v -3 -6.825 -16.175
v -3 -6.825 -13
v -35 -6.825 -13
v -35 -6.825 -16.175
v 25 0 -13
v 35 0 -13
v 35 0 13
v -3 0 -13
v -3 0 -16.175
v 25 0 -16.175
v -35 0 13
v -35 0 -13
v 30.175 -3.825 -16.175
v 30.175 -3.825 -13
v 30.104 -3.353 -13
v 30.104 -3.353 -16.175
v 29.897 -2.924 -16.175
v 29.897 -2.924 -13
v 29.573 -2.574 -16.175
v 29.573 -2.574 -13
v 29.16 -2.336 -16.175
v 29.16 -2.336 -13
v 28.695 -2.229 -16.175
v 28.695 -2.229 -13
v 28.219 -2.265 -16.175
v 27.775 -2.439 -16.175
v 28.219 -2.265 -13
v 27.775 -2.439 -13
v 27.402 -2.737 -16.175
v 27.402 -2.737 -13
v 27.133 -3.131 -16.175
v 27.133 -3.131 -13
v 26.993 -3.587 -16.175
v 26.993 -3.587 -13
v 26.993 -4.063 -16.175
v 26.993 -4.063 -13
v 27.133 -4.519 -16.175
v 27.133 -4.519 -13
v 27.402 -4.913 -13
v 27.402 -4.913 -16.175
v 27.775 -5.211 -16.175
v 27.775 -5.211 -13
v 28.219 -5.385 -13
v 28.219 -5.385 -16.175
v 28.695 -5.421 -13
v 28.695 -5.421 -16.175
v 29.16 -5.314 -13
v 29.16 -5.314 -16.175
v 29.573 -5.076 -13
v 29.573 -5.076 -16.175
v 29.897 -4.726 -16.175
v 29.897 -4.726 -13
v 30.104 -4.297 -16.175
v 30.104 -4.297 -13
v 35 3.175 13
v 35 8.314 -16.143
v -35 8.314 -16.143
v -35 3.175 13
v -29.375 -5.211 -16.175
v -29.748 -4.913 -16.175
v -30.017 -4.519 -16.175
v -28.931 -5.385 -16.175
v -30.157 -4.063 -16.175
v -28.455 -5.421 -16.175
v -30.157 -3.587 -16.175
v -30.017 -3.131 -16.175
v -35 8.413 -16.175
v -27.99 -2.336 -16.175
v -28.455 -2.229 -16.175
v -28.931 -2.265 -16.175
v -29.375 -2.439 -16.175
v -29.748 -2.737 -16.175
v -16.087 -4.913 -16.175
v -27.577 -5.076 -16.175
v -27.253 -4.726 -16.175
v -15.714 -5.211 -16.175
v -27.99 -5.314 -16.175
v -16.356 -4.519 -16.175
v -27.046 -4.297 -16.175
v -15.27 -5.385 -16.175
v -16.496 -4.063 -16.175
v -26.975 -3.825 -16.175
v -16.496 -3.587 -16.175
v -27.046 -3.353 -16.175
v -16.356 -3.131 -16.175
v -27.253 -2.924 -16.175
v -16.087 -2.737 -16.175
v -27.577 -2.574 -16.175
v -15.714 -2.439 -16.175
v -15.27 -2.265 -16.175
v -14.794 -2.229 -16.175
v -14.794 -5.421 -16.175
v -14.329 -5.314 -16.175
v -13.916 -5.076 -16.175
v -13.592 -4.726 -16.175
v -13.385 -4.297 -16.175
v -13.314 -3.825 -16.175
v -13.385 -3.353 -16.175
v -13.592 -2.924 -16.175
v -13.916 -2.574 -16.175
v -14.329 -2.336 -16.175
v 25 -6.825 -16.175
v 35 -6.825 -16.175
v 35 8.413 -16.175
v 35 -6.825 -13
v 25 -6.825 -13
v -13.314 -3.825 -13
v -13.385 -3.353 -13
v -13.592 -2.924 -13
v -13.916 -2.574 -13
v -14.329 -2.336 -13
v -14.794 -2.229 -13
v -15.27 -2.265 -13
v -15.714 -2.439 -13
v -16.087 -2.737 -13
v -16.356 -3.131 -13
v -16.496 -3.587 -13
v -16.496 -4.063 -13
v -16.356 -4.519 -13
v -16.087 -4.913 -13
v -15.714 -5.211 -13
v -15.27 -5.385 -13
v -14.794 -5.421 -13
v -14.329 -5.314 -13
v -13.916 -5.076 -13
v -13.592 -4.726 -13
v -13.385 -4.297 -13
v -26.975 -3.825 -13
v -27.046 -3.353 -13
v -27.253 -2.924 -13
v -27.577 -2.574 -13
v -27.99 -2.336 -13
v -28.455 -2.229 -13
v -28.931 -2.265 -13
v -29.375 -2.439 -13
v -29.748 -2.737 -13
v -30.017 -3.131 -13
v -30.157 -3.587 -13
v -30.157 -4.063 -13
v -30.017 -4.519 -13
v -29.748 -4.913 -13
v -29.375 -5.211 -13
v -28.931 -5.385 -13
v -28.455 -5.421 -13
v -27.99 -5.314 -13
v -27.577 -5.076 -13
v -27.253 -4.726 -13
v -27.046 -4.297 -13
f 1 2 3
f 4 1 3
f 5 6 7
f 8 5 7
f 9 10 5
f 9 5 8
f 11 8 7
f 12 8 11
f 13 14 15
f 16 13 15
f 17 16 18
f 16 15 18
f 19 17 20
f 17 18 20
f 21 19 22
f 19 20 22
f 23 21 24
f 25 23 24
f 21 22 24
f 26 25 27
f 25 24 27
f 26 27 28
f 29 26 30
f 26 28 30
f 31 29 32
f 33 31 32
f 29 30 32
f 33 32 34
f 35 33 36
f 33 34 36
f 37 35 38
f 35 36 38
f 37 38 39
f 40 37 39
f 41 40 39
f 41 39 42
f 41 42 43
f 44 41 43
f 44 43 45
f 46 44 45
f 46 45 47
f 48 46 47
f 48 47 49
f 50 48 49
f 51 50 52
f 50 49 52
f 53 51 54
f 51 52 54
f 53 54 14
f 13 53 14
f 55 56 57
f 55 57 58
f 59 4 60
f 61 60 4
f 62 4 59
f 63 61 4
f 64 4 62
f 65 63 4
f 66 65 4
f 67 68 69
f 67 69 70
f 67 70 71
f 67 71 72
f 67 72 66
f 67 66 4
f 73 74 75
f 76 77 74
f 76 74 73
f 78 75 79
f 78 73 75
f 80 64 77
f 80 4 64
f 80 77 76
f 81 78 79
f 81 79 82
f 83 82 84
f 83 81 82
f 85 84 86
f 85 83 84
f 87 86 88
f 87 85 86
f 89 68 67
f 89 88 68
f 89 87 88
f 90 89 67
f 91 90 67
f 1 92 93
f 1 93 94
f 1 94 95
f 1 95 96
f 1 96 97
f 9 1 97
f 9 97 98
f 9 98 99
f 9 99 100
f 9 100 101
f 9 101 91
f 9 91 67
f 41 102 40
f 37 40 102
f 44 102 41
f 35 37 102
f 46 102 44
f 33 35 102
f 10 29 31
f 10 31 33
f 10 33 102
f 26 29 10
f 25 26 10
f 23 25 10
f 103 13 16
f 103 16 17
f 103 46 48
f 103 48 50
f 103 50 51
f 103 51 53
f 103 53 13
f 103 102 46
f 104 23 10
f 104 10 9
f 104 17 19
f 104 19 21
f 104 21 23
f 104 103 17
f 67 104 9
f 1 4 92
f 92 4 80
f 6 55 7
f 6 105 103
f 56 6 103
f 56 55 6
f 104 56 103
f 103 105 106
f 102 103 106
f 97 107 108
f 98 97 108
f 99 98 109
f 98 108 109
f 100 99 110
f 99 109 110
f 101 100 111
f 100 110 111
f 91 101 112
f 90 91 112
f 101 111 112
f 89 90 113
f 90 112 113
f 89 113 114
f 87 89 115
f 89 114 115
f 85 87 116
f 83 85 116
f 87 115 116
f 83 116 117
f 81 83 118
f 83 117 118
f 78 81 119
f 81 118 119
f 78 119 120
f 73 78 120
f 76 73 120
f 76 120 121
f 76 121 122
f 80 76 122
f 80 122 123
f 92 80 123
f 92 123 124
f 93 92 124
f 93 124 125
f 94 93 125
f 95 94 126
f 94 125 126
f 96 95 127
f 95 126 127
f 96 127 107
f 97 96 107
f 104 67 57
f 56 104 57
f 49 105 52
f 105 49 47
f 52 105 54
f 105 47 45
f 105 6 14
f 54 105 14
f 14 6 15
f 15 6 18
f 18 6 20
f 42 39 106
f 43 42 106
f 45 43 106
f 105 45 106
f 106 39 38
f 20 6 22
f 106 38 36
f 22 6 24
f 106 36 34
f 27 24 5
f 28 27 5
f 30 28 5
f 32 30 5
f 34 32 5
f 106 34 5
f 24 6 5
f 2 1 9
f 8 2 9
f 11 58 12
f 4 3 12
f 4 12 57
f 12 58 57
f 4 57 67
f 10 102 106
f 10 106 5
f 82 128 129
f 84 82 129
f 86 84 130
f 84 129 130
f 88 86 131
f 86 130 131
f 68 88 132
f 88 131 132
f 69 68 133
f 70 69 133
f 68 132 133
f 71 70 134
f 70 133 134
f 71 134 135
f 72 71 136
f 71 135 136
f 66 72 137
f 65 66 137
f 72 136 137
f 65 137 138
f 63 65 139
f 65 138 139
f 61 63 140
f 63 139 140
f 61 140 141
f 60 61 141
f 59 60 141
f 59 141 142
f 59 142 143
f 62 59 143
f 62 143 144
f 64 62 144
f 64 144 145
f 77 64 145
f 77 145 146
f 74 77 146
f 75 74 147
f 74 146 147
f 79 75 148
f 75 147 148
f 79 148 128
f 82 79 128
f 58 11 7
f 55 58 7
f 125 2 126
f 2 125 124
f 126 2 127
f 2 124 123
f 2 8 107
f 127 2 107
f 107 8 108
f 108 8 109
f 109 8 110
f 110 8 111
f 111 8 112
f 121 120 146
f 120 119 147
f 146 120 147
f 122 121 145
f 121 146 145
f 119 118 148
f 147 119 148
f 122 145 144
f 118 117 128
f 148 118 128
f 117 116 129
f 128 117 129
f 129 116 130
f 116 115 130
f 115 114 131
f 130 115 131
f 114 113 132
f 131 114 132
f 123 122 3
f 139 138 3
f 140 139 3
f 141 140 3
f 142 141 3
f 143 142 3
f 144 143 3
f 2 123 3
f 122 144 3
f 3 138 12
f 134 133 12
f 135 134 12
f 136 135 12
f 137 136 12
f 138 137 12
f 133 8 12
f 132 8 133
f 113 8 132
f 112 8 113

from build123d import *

# Parameters (mm, degrees)
SKETCH1_W           = 70
SKETCH1_H           = 26
BOSS_EXTRUDE1_DEPTH = 3.175
SKETCH2_W           = 70
SKETCH2_H           = 10
BOSS_EXTRUDE2_DEPTH = 3.175
SKETCH3_R           = 1.6
CUT_EXTRUDE1_DEPTH  = 3.175
BOSS_EXTRUDE3_DEPTH = 70
SKETCH5_W           = 28
SKETCH5_H           = 6.825
CUT_EXTRUDE2_DEPTH  = 10


with BuildPart() as part:
    # Sketch1 → Boss-Extrude1 (new body)
    with BuildSketch(Plane(origin=(0, 0, 0), x_dir=(1, 0, 0), z_dir=(0, 1, 0))):
        Rectangle(SKETCH1_W, SKETCH1_H)
    extrude(amount=BOSS_EXTRUDE1_DEPTH)

    # Sketch2 → Boss-Extrude2 (add)
    with BuildSketch(Plane(origin=(0, 0, -13), x_dir=(-1, 0, 0), z_dir=(0, 0, -1))):
        with Locations((0, -1.825)):
            Rectangle(SKETCH2_W, SKETCH2_H)
    extrude(amount=BOSS_EXTRUDE2_DEPTH)

    # Sketch3 → Cut-Extrude1 (cut)
    with BuildSketch(Plane.XY.offset(-13)):
        with Locations((-14.914, -3.825)):
            Circle(SKETCH3_R)
        with Locations((28.575, -3.825)):
            Circle(SKETCH3_R)
        with Locations((-28.575, -3.825)):
            Circle(SKETCH3_R)
    extrude(amount=-CUT_EXTRUDE1_DEPTH, mode=Mode.SUBTRACT)

    # Sketch4 → Boss-Extrude3 (add)
    with BuildSketch(Plane(origin=(35, 0, 0), x_dir=(0, 0, -1), z_dir=(1, 0, 0))):
        Polygon((16.175, 3.175), (16.175, 8.412812241), (16.143192443, 8.313731132), (-13, 3.175), align=None)
    extrude(amount=-BOSS_EXTRUDE3_DEPTH)

    # Sketch5 → Cut-Extrude2 (cut)
    with BuildSketch(Plane(origin=(0, 0, -16.175), x_dir=(-1, 0, 0), z_dir=(0, 0, -1))):
        with Locations((-11, -3.4125)):
            Rectangle(SKETCH5_W, SKETCH5_H)
    extrude(amount=-CUT_EXTRUDE2_DEPTH, mode=Mode.SUBTRACT)


solid = part.part
